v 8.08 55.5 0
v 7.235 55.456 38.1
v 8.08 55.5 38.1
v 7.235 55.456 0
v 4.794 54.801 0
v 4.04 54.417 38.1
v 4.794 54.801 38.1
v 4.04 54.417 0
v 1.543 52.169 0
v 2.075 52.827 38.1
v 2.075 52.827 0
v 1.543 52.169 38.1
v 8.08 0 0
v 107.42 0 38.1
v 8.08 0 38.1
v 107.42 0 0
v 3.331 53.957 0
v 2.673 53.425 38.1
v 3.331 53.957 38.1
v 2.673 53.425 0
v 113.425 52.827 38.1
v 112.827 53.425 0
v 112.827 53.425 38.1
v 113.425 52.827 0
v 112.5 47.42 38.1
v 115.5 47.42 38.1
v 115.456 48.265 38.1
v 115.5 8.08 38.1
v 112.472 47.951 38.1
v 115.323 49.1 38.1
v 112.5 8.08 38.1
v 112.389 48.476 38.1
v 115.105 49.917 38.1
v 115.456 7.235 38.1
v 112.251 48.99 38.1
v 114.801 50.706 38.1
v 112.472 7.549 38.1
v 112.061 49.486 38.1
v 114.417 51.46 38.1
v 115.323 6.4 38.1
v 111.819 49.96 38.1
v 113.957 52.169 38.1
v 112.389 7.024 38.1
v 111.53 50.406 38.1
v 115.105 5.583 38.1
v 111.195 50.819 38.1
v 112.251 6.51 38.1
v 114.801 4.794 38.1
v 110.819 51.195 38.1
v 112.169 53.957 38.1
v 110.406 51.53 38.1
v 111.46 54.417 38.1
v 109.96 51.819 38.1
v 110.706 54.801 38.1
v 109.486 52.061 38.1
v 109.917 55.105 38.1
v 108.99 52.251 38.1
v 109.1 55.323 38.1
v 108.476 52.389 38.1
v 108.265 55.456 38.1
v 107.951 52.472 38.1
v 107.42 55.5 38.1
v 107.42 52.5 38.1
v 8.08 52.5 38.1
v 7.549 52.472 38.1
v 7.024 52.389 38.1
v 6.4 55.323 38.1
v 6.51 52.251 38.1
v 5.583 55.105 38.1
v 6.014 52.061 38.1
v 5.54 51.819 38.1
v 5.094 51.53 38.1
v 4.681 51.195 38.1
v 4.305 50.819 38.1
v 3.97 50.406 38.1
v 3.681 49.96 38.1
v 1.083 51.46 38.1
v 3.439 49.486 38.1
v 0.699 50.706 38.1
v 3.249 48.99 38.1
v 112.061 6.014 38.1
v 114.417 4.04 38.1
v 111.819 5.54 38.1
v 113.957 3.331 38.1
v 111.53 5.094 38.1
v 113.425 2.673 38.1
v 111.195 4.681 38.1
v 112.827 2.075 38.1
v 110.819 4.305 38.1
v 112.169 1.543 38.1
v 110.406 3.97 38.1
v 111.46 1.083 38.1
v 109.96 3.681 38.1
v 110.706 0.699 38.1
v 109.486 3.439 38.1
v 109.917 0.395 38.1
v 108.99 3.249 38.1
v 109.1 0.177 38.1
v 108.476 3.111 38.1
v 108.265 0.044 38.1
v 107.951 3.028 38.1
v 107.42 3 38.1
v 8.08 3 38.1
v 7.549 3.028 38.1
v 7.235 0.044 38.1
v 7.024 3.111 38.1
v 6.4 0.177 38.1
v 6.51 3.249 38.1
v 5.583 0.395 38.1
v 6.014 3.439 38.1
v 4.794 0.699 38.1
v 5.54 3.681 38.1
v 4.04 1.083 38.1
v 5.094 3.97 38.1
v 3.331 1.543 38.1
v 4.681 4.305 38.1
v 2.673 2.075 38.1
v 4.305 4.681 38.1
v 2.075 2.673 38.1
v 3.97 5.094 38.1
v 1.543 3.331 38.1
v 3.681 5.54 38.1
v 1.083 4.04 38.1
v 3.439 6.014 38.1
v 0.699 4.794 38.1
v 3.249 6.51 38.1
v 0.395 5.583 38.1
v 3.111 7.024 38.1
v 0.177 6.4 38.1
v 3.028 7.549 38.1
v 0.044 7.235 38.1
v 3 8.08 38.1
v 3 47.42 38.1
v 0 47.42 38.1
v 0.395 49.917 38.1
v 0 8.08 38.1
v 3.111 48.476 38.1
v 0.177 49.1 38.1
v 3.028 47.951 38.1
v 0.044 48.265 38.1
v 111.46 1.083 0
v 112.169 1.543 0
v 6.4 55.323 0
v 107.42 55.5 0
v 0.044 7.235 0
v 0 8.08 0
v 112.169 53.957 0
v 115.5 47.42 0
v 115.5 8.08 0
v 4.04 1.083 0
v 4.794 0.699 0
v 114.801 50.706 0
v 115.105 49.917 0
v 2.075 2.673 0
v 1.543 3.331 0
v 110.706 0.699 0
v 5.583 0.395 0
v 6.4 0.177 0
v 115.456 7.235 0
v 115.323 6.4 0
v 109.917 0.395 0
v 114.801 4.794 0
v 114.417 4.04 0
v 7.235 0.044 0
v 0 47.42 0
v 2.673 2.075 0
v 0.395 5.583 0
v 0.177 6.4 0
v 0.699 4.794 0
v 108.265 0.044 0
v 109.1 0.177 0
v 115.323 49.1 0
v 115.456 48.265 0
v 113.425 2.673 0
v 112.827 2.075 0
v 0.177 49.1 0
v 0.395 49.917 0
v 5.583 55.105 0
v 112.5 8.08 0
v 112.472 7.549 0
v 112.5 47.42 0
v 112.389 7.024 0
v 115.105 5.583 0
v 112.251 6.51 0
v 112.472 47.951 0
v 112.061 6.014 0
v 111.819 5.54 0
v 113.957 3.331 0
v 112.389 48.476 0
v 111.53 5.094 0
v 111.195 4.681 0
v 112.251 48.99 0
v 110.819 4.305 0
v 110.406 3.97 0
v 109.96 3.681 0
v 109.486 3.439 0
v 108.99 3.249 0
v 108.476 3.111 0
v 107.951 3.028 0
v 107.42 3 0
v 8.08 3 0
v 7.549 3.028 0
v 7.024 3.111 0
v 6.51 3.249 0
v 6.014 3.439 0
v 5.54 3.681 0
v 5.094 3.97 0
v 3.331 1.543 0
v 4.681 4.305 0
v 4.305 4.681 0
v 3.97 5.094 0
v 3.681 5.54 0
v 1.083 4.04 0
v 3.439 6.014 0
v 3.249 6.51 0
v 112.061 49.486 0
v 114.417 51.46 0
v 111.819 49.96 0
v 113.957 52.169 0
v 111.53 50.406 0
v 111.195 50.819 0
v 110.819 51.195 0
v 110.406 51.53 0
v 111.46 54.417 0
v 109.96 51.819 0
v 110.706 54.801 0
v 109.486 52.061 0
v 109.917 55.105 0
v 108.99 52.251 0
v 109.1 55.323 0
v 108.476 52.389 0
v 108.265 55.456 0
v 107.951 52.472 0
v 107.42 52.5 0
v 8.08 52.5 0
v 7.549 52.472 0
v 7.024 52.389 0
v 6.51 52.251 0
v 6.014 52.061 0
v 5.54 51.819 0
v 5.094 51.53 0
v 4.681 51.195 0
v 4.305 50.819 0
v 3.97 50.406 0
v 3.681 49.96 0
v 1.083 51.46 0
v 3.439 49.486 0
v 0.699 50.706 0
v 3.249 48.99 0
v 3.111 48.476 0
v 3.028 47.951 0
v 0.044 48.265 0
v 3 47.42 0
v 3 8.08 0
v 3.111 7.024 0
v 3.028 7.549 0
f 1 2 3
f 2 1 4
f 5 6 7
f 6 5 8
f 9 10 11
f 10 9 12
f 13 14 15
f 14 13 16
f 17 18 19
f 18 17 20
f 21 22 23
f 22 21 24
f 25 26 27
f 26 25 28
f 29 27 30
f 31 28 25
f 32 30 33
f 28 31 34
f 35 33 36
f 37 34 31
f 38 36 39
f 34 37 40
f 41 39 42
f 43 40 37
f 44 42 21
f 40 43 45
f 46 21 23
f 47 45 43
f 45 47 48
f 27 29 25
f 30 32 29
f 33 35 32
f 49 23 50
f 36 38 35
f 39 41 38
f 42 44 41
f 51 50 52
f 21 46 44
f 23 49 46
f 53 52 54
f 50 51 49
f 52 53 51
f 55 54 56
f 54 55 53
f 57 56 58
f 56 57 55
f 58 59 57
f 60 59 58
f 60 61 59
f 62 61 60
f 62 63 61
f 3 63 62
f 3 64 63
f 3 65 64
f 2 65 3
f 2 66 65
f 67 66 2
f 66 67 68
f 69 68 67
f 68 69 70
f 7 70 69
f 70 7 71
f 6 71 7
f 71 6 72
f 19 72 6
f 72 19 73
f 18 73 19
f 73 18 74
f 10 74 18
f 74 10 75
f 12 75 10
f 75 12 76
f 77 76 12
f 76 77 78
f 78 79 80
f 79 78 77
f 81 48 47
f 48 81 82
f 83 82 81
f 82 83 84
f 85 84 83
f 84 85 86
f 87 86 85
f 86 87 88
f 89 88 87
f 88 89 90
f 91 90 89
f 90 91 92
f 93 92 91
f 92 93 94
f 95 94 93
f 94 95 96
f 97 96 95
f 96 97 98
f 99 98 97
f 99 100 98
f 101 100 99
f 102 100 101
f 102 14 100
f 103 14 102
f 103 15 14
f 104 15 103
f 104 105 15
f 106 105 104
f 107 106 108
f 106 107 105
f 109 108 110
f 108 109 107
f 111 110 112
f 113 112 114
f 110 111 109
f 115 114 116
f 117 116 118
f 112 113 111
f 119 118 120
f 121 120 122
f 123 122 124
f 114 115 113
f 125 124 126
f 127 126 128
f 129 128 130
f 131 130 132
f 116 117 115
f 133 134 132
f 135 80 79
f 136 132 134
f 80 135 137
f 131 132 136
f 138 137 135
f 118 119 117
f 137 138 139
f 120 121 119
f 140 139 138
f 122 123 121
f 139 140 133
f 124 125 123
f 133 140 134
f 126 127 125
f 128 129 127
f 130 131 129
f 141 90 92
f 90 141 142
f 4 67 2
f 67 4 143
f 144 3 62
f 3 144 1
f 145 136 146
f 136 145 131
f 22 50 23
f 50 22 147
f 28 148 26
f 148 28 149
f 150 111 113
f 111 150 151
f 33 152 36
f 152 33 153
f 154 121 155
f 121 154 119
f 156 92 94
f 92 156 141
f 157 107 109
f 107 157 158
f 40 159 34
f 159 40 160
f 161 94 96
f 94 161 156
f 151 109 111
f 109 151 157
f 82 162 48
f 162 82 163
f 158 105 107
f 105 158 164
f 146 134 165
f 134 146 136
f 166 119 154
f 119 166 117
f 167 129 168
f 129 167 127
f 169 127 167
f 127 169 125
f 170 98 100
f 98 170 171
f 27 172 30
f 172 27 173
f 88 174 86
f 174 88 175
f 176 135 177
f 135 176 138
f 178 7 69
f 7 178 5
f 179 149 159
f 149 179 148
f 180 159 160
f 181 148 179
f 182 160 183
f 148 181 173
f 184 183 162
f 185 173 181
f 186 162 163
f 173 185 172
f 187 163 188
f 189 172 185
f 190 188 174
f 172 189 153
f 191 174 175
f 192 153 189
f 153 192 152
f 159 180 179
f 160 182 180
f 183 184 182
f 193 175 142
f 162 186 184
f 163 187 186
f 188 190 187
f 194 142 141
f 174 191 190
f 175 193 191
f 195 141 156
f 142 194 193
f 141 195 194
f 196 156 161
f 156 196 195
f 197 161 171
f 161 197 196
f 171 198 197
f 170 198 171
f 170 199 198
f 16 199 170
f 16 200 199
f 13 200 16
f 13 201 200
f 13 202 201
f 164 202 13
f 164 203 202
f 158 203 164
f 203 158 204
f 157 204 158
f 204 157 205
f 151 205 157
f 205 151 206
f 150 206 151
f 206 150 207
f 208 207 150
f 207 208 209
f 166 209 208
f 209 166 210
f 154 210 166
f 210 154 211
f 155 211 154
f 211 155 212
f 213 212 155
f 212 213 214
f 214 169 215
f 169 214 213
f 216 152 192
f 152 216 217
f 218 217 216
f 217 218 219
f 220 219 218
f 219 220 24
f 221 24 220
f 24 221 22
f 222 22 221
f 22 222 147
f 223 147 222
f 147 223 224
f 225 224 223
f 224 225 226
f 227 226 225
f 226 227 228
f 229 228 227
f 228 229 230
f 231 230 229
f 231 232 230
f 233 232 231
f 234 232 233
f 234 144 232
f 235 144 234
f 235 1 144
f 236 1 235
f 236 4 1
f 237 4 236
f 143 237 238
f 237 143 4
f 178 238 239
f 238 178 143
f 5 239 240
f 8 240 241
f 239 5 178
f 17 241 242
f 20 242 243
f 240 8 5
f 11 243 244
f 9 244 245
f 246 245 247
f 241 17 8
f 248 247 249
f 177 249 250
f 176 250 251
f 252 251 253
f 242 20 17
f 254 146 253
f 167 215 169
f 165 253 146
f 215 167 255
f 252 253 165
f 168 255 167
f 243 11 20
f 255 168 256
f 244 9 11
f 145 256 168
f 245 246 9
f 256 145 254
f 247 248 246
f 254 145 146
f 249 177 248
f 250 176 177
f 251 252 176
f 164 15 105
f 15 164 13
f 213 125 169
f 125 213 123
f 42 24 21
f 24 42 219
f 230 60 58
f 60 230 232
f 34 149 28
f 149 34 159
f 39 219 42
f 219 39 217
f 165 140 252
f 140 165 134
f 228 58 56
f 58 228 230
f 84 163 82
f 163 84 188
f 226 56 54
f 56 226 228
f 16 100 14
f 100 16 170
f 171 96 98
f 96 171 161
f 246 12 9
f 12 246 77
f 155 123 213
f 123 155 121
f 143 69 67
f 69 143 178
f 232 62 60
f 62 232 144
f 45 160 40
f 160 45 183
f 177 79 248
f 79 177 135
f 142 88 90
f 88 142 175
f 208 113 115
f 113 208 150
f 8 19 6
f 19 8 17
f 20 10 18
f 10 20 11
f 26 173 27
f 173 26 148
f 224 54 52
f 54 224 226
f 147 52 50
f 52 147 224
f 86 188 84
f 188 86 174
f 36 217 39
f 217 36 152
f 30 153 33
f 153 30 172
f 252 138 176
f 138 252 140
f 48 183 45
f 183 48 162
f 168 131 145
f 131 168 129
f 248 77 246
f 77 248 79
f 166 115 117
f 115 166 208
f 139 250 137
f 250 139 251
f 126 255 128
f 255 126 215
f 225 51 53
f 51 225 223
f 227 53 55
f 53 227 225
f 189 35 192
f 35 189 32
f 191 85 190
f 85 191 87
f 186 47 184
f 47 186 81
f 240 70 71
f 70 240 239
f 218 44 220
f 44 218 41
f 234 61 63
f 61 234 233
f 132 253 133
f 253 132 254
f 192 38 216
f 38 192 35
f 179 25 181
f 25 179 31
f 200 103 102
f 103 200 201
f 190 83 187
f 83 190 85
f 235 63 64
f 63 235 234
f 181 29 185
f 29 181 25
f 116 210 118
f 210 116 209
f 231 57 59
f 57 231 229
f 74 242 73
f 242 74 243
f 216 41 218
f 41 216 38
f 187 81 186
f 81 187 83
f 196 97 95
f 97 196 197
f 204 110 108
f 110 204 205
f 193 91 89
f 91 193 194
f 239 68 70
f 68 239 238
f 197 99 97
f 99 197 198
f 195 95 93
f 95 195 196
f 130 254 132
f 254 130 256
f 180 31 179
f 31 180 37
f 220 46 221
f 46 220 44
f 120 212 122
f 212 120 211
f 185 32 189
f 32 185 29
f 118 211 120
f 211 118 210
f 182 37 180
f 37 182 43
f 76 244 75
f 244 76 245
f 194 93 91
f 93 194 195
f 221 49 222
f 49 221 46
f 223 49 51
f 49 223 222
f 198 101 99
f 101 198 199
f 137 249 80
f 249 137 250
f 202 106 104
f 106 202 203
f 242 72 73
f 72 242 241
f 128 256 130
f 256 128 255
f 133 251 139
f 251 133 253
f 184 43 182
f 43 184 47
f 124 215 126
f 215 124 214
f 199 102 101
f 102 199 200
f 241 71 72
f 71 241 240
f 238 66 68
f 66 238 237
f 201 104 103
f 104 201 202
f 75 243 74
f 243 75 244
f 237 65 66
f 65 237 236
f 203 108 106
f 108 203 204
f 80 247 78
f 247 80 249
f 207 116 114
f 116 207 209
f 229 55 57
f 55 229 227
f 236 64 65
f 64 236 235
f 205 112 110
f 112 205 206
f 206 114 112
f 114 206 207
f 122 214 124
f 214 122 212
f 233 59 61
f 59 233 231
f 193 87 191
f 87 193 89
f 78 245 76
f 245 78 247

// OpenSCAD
//Rain Gauge Extension
//Designed by Bryscus: Bryce B.

//Most measurements are for the inside dimensions
//since in this case those are the dimensions
//that really matter.

//Height
H=38.1;

//Wall thickness
W=3;    

//Inside Corner radius
R=5.08; 

//Inside Length
L=109.5;

//Inside Width
B=49.5;

difference(){
translate([R+W,R+W,0]) 
minkowski(){
	cube([L-2*R,B-2*R,H/2]); // Outside
	cylinder(r=R+W, h=H/2,$fn=60);
	}
translate([R+W,R+W,-1]) 
minkowski(){
	cube([L-2*R,B-2*R,H/2]); // Inside
	cylinder(r=R, h=H/2+2,$fn=60);
	}
}

//cube([115.5,55.5,H]); //Minkowski Sanity Check
//Since Minkowski does weird things, this is a
//way to guarantee that the dimensions sought
//after are what we actually get
